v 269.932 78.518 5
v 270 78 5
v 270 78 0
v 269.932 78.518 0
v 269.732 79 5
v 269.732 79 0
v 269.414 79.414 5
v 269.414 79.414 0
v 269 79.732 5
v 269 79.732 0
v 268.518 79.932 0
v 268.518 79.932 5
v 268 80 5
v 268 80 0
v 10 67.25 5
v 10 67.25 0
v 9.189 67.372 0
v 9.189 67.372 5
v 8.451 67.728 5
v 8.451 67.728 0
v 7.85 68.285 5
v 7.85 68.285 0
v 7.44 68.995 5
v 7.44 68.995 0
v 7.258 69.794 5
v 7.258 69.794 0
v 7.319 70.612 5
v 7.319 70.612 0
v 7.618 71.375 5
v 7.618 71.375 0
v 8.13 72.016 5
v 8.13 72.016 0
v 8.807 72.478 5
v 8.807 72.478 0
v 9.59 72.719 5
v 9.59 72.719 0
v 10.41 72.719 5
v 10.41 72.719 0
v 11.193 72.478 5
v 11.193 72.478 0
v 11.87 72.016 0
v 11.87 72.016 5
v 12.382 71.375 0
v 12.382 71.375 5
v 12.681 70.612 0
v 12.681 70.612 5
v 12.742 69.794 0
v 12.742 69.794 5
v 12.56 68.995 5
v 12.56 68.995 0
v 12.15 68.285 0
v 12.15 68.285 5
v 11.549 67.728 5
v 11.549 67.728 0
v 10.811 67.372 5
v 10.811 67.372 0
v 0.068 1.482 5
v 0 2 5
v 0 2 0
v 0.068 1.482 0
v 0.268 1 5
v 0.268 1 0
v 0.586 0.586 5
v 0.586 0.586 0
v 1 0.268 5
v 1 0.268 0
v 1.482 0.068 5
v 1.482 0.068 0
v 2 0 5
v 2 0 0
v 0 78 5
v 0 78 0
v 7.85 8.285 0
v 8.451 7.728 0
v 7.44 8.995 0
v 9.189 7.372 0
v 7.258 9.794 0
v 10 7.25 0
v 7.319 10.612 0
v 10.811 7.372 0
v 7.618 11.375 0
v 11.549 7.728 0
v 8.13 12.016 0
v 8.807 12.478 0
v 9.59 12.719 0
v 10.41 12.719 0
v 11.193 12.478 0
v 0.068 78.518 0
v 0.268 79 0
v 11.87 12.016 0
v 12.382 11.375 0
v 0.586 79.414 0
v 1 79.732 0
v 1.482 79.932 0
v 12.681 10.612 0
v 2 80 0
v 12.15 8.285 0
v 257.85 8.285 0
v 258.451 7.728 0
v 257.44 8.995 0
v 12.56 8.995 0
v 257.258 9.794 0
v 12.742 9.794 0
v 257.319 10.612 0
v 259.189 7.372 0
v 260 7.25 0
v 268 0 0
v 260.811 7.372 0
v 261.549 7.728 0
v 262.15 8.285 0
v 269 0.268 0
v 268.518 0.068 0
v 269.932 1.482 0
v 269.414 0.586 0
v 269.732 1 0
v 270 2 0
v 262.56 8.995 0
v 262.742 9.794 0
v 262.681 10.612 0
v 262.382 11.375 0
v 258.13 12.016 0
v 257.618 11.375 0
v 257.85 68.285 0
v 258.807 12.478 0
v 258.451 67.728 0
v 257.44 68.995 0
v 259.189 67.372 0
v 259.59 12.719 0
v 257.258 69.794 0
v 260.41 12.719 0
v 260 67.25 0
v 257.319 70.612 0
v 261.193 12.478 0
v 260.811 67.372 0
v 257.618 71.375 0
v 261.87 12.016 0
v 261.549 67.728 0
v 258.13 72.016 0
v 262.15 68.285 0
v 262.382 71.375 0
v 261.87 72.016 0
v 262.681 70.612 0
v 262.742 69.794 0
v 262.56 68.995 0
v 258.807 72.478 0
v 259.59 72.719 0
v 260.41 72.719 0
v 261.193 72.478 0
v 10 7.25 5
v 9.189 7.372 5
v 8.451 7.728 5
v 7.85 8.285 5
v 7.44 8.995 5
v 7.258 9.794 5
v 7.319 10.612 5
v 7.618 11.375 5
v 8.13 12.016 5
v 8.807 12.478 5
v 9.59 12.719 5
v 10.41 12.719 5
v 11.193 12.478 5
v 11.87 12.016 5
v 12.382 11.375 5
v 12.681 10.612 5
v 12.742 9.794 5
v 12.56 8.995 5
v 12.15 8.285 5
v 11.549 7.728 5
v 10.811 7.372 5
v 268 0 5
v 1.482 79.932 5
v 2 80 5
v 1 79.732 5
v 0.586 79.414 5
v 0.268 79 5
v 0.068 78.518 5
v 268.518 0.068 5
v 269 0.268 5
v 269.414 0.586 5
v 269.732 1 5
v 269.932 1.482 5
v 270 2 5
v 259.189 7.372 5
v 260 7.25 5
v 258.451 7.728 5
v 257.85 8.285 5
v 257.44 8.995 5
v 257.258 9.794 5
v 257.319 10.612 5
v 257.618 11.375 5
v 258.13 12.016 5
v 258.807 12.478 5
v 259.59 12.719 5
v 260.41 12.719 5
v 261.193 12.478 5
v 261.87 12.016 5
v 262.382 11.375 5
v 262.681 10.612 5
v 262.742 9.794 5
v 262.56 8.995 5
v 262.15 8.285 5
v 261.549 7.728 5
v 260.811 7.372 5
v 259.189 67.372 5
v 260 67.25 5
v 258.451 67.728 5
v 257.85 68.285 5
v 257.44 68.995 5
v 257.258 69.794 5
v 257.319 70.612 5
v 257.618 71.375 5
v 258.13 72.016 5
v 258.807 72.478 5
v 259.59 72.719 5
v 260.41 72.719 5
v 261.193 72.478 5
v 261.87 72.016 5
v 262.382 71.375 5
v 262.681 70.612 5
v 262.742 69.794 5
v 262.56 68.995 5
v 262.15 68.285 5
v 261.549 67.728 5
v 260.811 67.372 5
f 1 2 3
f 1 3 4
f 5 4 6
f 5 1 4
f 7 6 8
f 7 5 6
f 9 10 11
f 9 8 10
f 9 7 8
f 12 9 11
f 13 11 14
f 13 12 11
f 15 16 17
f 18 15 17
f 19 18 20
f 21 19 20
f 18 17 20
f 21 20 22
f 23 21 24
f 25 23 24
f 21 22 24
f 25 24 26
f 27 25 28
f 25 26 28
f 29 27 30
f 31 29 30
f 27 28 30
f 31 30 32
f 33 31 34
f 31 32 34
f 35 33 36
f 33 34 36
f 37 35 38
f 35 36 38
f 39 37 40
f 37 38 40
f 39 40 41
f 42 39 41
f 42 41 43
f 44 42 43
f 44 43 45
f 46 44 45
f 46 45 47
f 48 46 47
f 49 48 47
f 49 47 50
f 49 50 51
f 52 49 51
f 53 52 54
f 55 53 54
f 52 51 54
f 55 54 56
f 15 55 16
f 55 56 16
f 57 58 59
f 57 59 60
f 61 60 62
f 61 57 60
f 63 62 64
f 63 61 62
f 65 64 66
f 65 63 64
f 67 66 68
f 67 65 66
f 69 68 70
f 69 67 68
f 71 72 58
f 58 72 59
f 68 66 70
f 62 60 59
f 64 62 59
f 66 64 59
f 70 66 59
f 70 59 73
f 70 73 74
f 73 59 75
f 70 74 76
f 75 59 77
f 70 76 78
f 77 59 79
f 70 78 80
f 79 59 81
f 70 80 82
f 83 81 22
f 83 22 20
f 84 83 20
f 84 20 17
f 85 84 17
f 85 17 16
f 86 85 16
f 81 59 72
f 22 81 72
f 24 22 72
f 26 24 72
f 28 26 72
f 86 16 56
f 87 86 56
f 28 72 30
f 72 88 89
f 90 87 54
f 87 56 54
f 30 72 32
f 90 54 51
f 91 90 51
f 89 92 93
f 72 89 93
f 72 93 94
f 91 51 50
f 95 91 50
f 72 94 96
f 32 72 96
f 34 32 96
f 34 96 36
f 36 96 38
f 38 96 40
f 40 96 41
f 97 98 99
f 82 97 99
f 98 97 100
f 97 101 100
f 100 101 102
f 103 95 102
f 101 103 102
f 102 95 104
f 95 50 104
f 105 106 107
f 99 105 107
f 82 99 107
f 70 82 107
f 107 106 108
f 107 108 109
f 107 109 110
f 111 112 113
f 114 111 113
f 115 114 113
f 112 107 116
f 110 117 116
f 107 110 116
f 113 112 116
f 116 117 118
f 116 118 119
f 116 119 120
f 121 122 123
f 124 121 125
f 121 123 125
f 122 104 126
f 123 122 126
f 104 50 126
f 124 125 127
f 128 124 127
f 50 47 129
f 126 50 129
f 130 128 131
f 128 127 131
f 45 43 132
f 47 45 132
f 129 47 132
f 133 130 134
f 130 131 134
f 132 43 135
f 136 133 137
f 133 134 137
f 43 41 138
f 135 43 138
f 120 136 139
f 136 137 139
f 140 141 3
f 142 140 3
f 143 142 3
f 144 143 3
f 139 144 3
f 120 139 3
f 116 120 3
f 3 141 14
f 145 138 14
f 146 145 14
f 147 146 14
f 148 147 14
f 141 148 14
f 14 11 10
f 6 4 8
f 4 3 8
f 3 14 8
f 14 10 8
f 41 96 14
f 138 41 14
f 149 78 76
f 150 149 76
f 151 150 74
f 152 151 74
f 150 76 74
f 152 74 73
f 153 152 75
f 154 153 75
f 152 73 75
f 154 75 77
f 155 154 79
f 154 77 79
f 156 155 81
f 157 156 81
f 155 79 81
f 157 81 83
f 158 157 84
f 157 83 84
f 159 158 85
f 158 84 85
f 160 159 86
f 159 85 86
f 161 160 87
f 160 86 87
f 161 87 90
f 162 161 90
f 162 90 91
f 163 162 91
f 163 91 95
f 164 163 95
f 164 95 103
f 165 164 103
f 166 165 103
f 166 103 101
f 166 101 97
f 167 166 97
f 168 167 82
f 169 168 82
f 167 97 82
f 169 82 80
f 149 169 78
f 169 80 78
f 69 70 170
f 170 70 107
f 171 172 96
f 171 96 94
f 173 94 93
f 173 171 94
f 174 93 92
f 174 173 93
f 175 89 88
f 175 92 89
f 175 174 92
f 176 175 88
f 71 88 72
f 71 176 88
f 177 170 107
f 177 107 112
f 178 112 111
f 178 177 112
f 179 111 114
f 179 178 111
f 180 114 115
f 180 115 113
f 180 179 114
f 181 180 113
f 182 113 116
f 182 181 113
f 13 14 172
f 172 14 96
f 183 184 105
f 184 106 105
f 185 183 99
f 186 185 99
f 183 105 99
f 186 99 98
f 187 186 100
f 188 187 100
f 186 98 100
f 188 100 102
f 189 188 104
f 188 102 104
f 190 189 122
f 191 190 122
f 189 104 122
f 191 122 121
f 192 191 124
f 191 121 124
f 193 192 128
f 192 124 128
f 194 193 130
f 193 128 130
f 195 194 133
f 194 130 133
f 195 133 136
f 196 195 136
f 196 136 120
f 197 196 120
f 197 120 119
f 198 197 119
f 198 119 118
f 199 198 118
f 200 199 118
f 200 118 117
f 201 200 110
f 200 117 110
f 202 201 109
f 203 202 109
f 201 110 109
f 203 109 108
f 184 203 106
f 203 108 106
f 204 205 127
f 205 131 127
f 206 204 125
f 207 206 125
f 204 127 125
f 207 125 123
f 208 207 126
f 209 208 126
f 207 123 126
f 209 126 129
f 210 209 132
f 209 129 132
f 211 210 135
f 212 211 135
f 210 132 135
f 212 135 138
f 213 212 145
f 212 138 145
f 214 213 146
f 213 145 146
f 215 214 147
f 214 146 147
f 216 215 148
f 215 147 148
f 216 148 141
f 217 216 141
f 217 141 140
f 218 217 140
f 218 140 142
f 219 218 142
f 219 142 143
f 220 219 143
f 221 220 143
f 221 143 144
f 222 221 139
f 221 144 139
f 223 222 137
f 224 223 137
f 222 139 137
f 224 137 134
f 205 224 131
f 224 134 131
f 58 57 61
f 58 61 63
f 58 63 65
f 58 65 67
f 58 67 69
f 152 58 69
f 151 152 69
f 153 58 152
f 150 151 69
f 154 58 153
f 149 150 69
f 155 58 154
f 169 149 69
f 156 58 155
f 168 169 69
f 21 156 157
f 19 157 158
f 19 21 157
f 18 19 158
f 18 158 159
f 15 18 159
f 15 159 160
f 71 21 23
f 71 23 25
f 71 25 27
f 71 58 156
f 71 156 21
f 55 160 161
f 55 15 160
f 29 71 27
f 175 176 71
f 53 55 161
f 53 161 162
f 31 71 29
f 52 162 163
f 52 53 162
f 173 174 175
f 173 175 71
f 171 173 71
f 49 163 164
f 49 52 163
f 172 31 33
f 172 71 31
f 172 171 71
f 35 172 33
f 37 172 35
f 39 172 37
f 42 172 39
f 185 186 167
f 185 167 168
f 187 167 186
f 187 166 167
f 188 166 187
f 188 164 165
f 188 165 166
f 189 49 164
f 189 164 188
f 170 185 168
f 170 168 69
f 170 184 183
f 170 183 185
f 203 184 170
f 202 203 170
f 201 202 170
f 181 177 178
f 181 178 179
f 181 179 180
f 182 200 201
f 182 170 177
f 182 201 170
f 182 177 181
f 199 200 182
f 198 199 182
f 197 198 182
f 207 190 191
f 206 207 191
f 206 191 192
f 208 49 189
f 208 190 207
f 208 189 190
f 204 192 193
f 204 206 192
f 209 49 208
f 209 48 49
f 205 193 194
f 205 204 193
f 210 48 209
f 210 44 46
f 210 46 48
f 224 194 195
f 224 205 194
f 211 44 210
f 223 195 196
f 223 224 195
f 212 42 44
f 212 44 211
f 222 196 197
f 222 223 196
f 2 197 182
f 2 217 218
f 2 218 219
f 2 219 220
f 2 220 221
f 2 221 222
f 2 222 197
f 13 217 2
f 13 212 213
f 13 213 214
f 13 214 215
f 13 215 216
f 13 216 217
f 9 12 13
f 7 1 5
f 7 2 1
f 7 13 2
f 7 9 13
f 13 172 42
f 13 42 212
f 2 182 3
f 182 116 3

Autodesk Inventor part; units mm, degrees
ref_plane "YZ Plane" through (0, 0, 0) normal (1, 0, 0) x (0, 1, 0)
ref_plane "XZ Plane" through (0, 0, 0) normal (0, 1, 0) x (-1, 0, 0)
ref_plane "XY Plane" through (0, 0, 0) normal (0, 0, 1) x (1, 0, 0)
sketch "Sketch1" plane through (0, 0, 0) normal (0, 0, 1) x (1, 0, 0)
  line L0 (0, 0) -> (270, 0)
  line L1 (270, 0) -> (270, 80)
  line L2 (270, 80) -> (0, 80)
  line L3 (0, 80) -> (0, 0)
  dimension "d2" = 80
  dimension "d3" = 270
extrude "Extrusion1" add sketch "Sketch1" along normal blind 5
sketch "Sketch2" plane through (0, 0, 5) normal (0, 0, 1) x (1, 0, 0)
  circle A0 centre (10, 70) radius 2.75
  circle A1 centre (260, 70) radius 2.75
  circle A2 centre (260, 10) radius 2.75
  circle A3 centre (10, 10) radius 2.75
  line L0 (270, 80) -> (0, 80) projected
  line L1 (0, 80) -> (0, 0) projected
  line L2 (270, 0) -> (270, 80) projected
  line L3 (0, 0) -> (270, 0) projected
  dimension "d4" = 10
  dimension "d5" = 10
  dimension "d6" = 10
  dimension "d7" = 10
  dimension "d8" = 10
  dimension "d9" = 10
  dimension "d10" = 10
  dimension "d11" = 10
  dimension "d12" = 5.5
  dimension "d13" = 5.5
  dimension "d14" = 5.5
  dimension "d15" = 5.5
hole "Hole1" at (10, 70, 5) at (10, 10, 5) at (260, 10, 5) at (260, 70, 5) direction (0, 0, -1) diameter 5.5 end through all
fillet "Fillet1" radius 2 4 edges at (0, 80, 2.5) (270, 80, 2.5) (270, 0, 2.5) (0, 0, 2.5)
equation "\"d5\" = d4"
equation "\"d6\" = d4"
equation "\"d7\" = d4"
equation "\"d8\" = d4"
equation "\"d9\" = d4"
equation "\"d10\" = d4"
equation "\"d11\" = d4"
equation "\"d13\" = d12"
equation "\"d14\" = d12"
equation "\"d15\" = d12"
equation "\"d16\" = d12"
properties part number "HeightPlates"
